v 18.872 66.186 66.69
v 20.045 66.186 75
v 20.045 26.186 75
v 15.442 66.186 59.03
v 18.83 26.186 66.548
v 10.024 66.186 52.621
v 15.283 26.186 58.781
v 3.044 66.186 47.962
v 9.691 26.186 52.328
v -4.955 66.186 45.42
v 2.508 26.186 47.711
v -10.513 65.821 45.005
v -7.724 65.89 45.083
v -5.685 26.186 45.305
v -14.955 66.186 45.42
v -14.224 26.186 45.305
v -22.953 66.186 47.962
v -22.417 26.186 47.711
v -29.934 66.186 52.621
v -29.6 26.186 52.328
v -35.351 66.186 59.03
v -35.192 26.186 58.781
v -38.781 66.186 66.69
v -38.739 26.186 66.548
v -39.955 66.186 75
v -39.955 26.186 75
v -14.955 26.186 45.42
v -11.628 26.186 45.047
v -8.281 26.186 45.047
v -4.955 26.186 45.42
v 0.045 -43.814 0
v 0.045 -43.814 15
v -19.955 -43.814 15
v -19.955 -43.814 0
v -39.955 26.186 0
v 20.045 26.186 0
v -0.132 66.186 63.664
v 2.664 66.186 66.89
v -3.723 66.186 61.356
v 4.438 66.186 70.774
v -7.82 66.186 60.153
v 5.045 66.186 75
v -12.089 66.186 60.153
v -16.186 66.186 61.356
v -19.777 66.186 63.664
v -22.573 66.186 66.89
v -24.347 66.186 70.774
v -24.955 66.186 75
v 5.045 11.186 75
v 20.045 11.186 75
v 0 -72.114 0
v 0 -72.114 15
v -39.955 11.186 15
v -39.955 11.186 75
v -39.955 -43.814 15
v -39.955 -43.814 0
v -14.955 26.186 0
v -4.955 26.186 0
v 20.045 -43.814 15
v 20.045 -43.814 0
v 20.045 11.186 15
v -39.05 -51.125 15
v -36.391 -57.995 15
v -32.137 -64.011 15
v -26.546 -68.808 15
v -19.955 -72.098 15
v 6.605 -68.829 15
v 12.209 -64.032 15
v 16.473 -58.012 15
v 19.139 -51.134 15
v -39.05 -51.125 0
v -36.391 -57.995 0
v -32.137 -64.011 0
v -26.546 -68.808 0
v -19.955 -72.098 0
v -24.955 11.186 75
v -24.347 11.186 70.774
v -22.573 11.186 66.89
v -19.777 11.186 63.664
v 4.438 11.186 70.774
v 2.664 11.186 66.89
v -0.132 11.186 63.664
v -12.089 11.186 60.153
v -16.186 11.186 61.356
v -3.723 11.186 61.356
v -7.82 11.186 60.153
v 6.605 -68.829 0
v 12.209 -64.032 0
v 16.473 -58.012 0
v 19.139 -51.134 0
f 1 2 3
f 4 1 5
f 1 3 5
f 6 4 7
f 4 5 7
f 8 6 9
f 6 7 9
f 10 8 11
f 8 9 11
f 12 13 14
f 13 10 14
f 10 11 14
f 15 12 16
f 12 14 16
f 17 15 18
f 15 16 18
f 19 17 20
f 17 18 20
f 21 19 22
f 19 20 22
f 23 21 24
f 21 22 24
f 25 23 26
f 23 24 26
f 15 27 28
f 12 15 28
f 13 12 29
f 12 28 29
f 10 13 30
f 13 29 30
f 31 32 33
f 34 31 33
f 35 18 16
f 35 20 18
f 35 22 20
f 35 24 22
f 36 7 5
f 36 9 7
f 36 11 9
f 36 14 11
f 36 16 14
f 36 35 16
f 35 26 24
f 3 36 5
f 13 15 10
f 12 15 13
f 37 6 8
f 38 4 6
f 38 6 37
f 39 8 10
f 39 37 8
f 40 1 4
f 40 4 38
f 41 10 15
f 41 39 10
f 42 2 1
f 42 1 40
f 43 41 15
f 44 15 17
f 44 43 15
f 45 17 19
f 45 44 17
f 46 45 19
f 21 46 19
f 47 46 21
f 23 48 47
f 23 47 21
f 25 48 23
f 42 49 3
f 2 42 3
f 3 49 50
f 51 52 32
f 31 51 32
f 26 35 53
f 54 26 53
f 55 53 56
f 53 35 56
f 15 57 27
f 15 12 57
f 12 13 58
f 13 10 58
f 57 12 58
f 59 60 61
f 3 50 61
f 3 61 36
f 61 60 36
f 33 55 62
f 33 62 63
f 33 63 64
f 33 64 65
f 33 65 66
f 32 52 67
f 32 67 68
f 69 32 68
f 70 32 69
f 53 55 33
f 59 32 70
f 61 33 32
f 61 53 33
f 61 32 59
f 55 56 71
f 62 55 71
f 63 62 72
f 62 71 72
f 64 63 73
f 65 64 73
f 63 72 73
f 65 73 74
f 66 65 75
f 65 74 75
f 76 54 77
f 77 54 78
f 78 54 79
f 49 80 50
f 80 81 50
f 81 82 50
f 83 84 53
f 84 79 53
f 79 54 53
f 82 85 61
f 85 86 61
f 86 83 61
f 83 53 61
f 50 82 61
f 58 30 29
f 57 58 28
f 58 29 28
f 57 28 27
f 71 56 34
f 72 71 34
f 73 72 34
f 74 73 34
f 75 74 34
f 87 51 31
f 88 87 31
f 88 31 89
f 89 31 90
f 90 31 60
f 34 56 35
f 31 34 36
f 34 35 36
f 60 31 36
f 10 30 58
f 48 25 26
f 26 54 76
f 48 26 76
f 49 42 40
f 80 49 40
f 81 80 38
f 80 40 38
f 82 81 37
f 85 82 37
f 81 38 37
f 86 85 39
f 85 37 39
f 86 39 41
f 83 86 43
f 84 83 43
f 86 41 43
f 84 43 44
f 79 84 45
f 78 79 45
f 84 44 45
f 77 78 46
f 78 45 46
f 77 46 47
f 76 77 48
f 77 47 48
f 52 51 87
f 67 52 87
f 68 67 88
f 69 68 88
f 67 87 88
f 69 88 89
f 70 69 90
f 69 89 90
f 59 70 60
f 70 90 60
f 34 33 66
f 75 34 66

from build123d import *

# Parameters (mm, degrees)
F0_W      = 60
F0_H      = 15
F1_DEPTH  = 75
F2_DEPTH  = 15
F4_DEPTH  = 41.2
F6_DEPTH  = 40
F7_R      = 15
F8_DEPTH  = 168.2
F10_DEPTH = 40
F12_DEPTH = 25


with BuildPart() as f1:
    # F0 (on Top) → F1 (new body)
    with BuildSketch(Plane.XY):
        with Locations((-9.9545444548, 18.6863616109)):
            Rectangle(F0_W, F0_H)
    extrude(amount=F1_DEPTH)

    # F0 (on Top) → F2 (join)
    with BuildSketch(Plane.XY):
        with BuildLine():
            Line((20.0454555452, 11.1863616109), (-39.9545444548, 11.1863616109))
            Line((-39.9545444548, 11.1863616109), (-39.9545444548, -43.8136383891))
            ThreePointArc((-39.9545444548, -43.8136383891), (-9.9545444548, -13.8136383891), (20.0454555452, -43.8136383891))
            Line((20.0454555452, -43.8136383891), (20.0454555452, 11.1863616109))
        make_face()
        with BuildLine():
            ThreePointArc((20.0454555452, -43.8136383891), (-9.9545444548, -13.8136383891), (-39.9545444548, -43.8136383891))
            Line((-39.9545444548, -43.8136383891), (-19.9545444548, -43.8136383891))
            Line((-19.9545444548, -43.8136383891), (-9.9545444548, -43.8136383891))
            Line((-9.9545444548, -43.8136383891), (0.0454555452, -43.8136383891))
            Line((0.0454555452, -43.8136383891), (20.0454555452, -43.8136383891))
        make_face()
        with BuildLine():
            Line((-19.9545444548, -43.8136383891), (-39.9545444548, -43.8136383891))
            ThreePointArc((-39.9545444548, -43.8136383891), (-34.4494418826, -61.1341464648), (-19.9545444548, -72.0979096366))
            Line((-19.9545444548, -72.0979096366), (-19.9545444548, -43.8136383891))
        make_face()
        with BuildLine():
            ThreePointArc((0, -72.1139395306), (14.5264311553, -61.1538181223), (20.0454555452, -43.8136383891))
            Line((20.0454555452, -43.8136383891), (0.0454555452, -43.8136383891))
            Line((0.0454555452, -43.8136383891), (0, -72.1139395306))
        make_face()
        with BuildLine():
            Line((-9.9545444548, -43.8136383891), (-19.9545444548, -43.8136383891))
            Line((-19.9545444548, -43.8136383891), (-19.9545444548, -72.0979096366))
            ThreePointArc((-19.9545444548, -72.0979096366), (-9.9786440611, -73.8136287093), (0, -72.1139395306))
            Line((0, -72.1139395306), (0.0454555452, -43.8136383891))
            Line((0.0454555452, -43.8136383891), (-9.9545444548, -43.8136383891))
        make_face()
    extrude(amount=F2_DEPTH)

    # F3 (on face) → F4 (cut)
    with BuildSketch(Plane.XY.offset(15)):
        with BuildLine():
            Line((-19.9545444548, -43.8136383891), (-19.9545444548, -72.0979096366))
            ThreePointArc((-19.9545444548, -72.0979096366), (-9.9786440611, -73.8136287093), (0, -72.1139395306))
            Line((0, -72.1139395306), (0.0454555452, -43.8136383891))
            Line((0.0454555452, -43.8136383891), (-19.9545444548, -43.8136383891))
        make_face()
    extrude(amount=-F4_DEPTH, mode=Mode.SUBTRACT)

    # F5 (on face) → F6 (join)
    with BuildSketch(Plane(origin=(0, 26.1863616109, 0), x_dir=(-1, 0, 0), z_dir=(0, 1, 0))):
        with BuildLine():
            Line((24.9545444548, 75), (-5.0454555452, 75))
            ThreePointArc((-5.0454555452, 75), (9.9545444548, 60), (24.9545444548, 75))
        make_face()
        with BuildLine():
            ThreePointArc((24.9545444548, 75), (9.9545444548, 60), (-5.0454555452, 75))
            Line((-5.0454555452, 75), (-20.0454555452, 75))
            ThreePointArc((-20.0454555452, 75), (9.9545444548, 45), (39.9545444548, 75))
            Line((39.9545444548, 75), (24.9545444548, 75))
        make_face()
    extrude(amount=F6_DEPTH)

    # F7 (on face) → F8 (cut)
    with BuildSketch(Plane(origin=(0, 66.1863616109, 0), x_dir=(-1, 0, 0), z_dir=(0, 1, 0))):
        with Locations((9.9545444548, 75)):
            Circle(F7_R)
    extrude(amount=-F8_DEPTH, mode=Mode.SUBTRACT)


with BuildPart() as f10:
    # F9 (on face) → F10 (new body)
    with BuildSketch(Plane(origin=(0, 26.1863616109, 0), x_dir=(-1, 0, 0), z_dir=(0, 1, 0))):
        Polygon((14.9545444548, 45.4196010845), (4.9545444548, 0), (14.9545444548, 0), align=None)
        with BuildLine():
            Line((4.9545444548, 45.4196010845), (4.9545444548, 0))
            Line((4.9545444548, 0), (14.9545444548, 45.4196010845))
            ThreePointArc((14.9545444548, 45.4196010845), (9.9545444548, 45), (4.9545444548, 45.4196010845))
        make_face()
    extrude(amount=F10_DEPTH)


with BuildPart() as f12_tool:
    # F11 (on face) → F12 (new body)
    with BuildSketch(Plane.YZ.offset(-4.9545444548)):
        Polygon((66.1863616109, 0), (66.1863616109, 45.4196010845), (26.1863616109, 0), align=None)
    extrude(amount=-F12_DEPTH)


with BuildPart() as f1_1:
    add(f1.part)

    # F12: cut by f12_tool
    add(f12_tool.part, mode=Mode.SUBTRACT)


with BuildPart() as f10_1:
    add(f10.part)

    # F12: cut by f12_tool
    add(f12_tool.part, mode=Mode.SUBTRACT)


solid = Compound([f1_1.part, f10_1.part])
